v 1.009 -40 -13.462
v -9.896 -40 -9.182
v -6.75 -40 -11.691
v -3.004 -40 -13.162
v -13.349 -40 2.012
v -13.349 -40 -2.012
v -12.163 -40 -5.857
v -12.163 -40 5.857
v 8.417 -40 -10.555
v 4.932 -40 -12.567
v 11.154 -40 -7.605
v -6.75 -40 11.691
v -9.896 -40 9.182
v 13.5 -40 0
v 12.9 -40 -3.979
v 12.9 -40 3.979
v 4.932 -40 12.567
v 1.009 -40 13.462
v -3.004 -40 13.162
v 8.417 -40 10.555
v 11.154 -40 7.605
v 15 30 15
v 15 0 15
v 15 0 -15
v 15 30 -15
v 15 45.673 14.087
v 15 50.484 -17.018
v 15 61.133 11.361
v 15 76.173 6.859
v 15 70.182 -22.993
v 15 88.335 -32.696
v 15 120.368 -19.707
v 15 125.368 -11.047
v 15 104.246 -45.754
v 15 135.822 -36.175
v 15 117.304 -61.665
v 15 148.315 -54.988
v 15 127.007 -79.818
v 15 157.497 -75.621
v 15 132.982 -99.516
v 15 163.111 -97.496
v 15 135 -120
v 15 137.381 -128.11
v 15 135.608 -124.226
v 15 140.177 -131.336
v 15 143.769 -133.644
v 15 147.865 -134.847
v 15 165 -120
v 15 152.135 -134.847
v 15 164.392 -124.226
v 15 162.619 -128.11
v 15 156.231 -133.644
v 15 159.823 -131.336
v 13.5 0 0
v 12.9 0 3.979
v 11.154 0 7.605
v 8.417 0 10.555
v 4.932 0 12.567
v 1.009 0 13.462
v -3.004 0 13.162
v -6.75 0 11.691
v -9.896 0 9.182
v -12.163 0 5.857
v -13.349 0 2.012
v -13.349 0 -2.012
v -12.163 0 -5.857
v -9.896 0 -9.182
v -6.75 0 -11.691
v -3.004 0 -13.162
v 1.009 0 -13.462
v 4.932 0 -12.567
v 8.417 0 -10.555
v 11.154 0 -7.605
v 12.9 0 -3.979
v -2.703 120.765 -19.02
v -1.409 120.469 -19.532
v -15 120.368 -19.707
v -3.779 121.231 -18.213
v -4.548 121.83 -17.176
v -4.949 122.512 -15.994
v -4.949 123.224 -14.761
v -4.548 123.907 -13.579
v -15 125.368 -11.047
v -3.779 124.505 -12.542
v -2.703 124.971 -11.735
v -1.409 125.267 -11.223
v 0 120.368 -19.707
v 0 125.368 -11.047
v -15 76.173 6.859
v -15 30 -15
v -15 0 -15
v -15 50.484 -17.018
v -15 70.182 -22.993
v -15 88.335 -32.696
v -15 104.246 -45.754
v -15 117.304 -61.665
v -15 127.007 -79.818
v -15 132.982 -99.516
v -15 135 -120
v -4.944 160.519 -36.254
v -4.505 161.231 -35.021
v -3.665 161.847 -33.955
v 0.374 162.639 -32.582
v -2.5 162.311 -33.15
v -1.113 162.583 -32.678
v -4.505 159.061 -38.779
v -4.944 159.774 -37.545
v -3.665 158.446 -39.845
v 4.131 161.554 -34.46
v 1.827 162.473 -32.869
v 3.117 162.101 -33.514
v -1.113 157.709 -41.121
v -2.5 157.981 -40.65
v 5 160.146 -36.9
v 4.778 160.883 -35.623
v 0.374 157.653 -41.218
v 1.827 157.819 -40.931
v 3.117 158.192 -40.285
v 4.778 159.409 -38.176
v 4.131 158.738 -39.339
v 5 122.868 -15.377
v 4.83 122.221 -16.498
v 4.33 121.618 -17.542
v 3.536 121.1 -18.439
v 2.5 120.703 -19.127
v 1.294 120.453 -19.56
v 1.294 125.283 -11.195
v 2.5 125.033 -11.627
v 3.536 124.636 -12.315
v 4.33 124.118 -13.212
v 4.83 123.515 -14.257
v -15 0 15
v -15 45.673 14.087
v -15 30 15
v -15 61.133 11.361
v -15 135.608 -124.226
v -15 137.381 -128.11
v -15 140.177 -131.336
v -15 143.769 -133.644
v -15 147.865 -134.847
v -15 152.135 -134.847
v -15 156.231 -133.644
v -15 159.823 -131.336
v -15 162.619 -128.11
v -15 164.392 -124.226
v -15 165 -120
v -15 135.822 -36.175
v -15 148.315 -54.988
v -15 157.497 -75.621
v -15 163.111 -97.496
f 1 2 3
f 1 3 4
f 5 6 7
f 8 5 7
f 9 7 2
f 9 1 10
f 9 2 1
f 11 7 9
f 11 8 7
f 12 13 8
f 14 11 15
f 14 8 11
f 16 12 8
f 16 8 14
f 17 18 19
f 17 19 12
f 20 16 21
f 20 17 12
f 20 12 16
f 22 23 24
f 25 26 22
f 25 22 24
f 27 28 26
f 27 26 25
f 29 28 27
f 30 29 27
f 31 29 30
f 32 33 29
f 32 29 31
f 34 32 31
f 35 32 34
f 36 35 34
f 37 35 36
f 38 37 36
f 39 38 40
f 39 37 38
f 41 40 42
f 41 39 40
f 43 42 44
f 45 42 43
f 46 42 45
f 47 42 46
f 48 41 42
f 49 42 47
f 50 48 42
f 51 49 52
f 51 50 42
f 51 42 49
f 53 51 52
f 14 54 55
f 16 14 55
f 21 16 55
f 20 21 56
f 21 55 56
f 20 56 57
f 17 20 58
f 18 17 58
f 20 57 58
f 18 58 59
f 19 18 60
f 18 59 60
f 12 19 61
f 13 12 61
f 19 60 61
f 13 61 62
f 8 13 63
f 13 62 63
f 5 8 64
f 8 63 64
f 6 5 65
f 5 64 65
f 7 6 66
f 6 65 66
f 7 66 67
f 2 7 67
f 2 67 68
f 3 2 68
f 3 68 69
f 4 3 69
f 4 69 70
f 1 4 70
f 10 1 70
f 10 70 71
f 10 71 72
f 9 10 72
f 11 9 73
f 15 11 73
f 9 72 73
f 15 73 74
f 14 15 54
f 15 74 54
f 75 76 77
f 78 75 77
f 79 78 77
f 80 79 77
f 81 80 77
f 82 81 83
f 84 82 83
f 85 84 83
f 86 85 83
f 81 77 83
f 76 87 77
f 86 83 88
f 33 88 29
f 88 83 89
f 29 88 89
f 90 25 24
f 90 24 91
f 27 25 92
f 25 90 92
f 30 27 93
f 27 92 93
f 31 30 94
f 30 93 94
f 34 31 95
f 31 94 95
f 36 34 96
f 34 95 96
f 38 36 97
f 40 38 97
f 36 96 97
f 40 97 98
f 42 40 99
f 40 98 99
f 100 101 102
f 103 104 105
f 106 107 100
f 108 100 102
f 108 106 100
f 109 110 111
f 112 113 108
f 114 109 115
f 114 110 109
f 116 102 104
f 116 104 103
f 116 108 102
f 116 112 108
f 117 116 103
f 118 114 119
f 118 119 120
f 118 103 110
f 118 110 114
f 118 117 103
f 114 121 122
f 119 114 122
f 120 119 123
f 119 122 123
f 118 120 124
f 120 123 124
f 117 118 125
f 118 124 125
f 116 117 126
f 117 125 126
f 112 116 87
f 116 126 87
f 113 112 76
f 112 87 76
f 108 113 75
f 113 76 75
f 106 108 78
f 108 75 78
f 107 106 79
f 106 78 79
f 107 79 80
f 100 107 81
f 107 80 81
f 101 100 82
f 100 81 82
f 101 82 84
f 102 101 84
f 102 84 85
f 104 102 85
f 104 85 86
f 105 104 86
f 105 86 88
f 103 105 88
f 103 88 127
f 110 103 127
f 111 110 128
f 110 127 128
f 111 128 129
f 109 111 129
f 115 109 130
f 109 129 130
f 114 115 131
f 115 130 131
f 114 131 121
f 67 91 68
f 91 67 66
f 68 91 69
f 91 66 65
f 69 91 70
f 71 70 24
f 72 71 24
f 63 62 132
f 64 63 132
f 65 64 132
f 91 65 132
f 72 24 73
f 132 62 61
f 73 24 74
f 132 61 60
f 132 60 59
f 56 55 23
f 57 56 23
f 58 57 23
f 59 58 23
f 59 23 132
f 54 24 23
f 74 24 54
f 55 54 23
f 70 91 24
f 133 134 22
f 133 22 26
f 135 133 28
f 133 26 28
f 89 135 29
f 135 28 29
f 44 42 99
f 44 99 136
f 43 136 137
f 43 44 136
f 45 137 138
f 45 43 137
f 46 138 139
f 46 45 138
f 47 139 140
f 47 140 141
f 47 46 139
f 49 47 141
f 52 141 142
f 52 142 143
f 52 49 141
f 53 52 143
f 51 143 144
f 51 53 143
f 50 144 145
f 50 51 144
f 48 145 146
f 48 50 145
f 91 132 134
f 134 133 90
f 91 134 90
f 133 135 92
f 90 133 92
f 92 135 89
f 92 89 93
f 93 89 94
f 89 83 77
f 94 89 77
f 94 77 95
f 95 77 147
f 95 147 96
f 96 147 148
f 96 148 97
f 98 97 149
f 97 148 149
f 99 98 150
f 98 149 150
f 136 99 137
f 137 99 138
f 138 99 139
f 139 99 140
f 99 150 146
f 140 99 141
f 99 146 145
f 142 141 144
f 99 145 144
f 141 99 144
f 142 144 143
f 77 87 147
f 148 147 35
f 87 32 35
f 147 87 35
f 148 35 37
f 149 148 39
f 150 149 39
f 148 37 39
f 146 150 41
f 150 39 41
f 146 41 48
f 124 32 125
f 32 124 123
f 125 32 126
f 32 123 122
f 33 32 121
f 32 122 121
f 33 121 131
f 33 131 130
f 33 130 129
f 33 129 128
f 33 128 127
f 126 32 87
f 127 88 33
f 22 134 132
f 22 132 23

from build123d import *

# Parameters (mm, degrees)
SKETCH2_W           = 30
SKETCH2_H           = 30
SKETCH3_R           = 13.5
BOSS_EXTRUDE1_DEPTH = 40
BOSS_EXTRUDE2_DEPTH = 30
BOSS_EXTRUDE3_START = -15
BOSS_EXTRUDE3_DEPTH = 30
SKETCH6_R           = 5
BOSS_EXTRUDE4_DEPTH = 43.044915


with BuildPart() as part:
    # Sweep1: sweep along a path in Sketch1
    with BuildLine(Plane(origin=(0, 0, 0), x_dir=(0, 0, -1), z_dir=(1, 0, 0))) as sweep1_path:
        Line((0, 0), (0, 30))
        ThreePointArc((0, 30), (35.147186258, 114.852813742), (120, 150))
    # Sketch2 → Sweep1 (sweep)
    with BuildSketch(Plane(origin=(0, 0, 0), x_dir=(1, 0, 0), z_dir=(0, 1, 0))):
        Rectangle(SKETCH2_W, SKETCH2_H)
    sweep(path=sweep1_path.line)

    # Sketch3 → Boss-Extrude1 (add)
    with BuildSketch(Plane.XZ):
        Circle(SKETCH3_R)
    extrude(amount=BOSS_EXTRUDE1_DEPTH)

    # Sketch4 → Boss-Extrude2 (add)
    with BuildSketch(Plane(origin=(15, 0, 0), x_dir=(0, 0, -1), z_dir=(1, 0, 0))):
        with BuildLine():
            Line((120, 165), (120, 135))
            ThreePointArc((120, 135), (135, 150), (120, 165))
        make_face()
    extrude(amount=-BOSS_EXTRUDE2_DEPTH)

    # Sketch5 → Boss-Extrude3 (add)
    with BuildSketch(Plane(origin=(0, 0, 0), x_dir=(0, 0, -1), z_dir=(1, 0, 0)).offset(BOSS_EXTRUDE3_START)):
        with BuildLine():
            Line((19.707410468, 120.368116529), (11.04715643, 125.368116529))
            Line((11.04715643, 125.368116529), (-6.858503806, 76.172719349))
            ThreePointArc((-6.858503806, 76.172719349), (4.294714537, 99.550606869), (19.707410468, 120.368116529))
        make_face()
    extrude(amount=BOSS_EXTRUDE3_DEPTH)

    # Sketch6 → Boss-Extrude4 (add)
    with BuildSketch(Plane(origin=(0, 98.809646451, -57.047775977), x_dir=(1, 0, 0), z_dir=(0, 0.866025404, -0.5))):
        with Locations((0, -48.116940156)):
            Circle(SKETCH6_R)
    extrude(amount=BOSS_EXTRUDE4_DEPTH)


solid = part.part
